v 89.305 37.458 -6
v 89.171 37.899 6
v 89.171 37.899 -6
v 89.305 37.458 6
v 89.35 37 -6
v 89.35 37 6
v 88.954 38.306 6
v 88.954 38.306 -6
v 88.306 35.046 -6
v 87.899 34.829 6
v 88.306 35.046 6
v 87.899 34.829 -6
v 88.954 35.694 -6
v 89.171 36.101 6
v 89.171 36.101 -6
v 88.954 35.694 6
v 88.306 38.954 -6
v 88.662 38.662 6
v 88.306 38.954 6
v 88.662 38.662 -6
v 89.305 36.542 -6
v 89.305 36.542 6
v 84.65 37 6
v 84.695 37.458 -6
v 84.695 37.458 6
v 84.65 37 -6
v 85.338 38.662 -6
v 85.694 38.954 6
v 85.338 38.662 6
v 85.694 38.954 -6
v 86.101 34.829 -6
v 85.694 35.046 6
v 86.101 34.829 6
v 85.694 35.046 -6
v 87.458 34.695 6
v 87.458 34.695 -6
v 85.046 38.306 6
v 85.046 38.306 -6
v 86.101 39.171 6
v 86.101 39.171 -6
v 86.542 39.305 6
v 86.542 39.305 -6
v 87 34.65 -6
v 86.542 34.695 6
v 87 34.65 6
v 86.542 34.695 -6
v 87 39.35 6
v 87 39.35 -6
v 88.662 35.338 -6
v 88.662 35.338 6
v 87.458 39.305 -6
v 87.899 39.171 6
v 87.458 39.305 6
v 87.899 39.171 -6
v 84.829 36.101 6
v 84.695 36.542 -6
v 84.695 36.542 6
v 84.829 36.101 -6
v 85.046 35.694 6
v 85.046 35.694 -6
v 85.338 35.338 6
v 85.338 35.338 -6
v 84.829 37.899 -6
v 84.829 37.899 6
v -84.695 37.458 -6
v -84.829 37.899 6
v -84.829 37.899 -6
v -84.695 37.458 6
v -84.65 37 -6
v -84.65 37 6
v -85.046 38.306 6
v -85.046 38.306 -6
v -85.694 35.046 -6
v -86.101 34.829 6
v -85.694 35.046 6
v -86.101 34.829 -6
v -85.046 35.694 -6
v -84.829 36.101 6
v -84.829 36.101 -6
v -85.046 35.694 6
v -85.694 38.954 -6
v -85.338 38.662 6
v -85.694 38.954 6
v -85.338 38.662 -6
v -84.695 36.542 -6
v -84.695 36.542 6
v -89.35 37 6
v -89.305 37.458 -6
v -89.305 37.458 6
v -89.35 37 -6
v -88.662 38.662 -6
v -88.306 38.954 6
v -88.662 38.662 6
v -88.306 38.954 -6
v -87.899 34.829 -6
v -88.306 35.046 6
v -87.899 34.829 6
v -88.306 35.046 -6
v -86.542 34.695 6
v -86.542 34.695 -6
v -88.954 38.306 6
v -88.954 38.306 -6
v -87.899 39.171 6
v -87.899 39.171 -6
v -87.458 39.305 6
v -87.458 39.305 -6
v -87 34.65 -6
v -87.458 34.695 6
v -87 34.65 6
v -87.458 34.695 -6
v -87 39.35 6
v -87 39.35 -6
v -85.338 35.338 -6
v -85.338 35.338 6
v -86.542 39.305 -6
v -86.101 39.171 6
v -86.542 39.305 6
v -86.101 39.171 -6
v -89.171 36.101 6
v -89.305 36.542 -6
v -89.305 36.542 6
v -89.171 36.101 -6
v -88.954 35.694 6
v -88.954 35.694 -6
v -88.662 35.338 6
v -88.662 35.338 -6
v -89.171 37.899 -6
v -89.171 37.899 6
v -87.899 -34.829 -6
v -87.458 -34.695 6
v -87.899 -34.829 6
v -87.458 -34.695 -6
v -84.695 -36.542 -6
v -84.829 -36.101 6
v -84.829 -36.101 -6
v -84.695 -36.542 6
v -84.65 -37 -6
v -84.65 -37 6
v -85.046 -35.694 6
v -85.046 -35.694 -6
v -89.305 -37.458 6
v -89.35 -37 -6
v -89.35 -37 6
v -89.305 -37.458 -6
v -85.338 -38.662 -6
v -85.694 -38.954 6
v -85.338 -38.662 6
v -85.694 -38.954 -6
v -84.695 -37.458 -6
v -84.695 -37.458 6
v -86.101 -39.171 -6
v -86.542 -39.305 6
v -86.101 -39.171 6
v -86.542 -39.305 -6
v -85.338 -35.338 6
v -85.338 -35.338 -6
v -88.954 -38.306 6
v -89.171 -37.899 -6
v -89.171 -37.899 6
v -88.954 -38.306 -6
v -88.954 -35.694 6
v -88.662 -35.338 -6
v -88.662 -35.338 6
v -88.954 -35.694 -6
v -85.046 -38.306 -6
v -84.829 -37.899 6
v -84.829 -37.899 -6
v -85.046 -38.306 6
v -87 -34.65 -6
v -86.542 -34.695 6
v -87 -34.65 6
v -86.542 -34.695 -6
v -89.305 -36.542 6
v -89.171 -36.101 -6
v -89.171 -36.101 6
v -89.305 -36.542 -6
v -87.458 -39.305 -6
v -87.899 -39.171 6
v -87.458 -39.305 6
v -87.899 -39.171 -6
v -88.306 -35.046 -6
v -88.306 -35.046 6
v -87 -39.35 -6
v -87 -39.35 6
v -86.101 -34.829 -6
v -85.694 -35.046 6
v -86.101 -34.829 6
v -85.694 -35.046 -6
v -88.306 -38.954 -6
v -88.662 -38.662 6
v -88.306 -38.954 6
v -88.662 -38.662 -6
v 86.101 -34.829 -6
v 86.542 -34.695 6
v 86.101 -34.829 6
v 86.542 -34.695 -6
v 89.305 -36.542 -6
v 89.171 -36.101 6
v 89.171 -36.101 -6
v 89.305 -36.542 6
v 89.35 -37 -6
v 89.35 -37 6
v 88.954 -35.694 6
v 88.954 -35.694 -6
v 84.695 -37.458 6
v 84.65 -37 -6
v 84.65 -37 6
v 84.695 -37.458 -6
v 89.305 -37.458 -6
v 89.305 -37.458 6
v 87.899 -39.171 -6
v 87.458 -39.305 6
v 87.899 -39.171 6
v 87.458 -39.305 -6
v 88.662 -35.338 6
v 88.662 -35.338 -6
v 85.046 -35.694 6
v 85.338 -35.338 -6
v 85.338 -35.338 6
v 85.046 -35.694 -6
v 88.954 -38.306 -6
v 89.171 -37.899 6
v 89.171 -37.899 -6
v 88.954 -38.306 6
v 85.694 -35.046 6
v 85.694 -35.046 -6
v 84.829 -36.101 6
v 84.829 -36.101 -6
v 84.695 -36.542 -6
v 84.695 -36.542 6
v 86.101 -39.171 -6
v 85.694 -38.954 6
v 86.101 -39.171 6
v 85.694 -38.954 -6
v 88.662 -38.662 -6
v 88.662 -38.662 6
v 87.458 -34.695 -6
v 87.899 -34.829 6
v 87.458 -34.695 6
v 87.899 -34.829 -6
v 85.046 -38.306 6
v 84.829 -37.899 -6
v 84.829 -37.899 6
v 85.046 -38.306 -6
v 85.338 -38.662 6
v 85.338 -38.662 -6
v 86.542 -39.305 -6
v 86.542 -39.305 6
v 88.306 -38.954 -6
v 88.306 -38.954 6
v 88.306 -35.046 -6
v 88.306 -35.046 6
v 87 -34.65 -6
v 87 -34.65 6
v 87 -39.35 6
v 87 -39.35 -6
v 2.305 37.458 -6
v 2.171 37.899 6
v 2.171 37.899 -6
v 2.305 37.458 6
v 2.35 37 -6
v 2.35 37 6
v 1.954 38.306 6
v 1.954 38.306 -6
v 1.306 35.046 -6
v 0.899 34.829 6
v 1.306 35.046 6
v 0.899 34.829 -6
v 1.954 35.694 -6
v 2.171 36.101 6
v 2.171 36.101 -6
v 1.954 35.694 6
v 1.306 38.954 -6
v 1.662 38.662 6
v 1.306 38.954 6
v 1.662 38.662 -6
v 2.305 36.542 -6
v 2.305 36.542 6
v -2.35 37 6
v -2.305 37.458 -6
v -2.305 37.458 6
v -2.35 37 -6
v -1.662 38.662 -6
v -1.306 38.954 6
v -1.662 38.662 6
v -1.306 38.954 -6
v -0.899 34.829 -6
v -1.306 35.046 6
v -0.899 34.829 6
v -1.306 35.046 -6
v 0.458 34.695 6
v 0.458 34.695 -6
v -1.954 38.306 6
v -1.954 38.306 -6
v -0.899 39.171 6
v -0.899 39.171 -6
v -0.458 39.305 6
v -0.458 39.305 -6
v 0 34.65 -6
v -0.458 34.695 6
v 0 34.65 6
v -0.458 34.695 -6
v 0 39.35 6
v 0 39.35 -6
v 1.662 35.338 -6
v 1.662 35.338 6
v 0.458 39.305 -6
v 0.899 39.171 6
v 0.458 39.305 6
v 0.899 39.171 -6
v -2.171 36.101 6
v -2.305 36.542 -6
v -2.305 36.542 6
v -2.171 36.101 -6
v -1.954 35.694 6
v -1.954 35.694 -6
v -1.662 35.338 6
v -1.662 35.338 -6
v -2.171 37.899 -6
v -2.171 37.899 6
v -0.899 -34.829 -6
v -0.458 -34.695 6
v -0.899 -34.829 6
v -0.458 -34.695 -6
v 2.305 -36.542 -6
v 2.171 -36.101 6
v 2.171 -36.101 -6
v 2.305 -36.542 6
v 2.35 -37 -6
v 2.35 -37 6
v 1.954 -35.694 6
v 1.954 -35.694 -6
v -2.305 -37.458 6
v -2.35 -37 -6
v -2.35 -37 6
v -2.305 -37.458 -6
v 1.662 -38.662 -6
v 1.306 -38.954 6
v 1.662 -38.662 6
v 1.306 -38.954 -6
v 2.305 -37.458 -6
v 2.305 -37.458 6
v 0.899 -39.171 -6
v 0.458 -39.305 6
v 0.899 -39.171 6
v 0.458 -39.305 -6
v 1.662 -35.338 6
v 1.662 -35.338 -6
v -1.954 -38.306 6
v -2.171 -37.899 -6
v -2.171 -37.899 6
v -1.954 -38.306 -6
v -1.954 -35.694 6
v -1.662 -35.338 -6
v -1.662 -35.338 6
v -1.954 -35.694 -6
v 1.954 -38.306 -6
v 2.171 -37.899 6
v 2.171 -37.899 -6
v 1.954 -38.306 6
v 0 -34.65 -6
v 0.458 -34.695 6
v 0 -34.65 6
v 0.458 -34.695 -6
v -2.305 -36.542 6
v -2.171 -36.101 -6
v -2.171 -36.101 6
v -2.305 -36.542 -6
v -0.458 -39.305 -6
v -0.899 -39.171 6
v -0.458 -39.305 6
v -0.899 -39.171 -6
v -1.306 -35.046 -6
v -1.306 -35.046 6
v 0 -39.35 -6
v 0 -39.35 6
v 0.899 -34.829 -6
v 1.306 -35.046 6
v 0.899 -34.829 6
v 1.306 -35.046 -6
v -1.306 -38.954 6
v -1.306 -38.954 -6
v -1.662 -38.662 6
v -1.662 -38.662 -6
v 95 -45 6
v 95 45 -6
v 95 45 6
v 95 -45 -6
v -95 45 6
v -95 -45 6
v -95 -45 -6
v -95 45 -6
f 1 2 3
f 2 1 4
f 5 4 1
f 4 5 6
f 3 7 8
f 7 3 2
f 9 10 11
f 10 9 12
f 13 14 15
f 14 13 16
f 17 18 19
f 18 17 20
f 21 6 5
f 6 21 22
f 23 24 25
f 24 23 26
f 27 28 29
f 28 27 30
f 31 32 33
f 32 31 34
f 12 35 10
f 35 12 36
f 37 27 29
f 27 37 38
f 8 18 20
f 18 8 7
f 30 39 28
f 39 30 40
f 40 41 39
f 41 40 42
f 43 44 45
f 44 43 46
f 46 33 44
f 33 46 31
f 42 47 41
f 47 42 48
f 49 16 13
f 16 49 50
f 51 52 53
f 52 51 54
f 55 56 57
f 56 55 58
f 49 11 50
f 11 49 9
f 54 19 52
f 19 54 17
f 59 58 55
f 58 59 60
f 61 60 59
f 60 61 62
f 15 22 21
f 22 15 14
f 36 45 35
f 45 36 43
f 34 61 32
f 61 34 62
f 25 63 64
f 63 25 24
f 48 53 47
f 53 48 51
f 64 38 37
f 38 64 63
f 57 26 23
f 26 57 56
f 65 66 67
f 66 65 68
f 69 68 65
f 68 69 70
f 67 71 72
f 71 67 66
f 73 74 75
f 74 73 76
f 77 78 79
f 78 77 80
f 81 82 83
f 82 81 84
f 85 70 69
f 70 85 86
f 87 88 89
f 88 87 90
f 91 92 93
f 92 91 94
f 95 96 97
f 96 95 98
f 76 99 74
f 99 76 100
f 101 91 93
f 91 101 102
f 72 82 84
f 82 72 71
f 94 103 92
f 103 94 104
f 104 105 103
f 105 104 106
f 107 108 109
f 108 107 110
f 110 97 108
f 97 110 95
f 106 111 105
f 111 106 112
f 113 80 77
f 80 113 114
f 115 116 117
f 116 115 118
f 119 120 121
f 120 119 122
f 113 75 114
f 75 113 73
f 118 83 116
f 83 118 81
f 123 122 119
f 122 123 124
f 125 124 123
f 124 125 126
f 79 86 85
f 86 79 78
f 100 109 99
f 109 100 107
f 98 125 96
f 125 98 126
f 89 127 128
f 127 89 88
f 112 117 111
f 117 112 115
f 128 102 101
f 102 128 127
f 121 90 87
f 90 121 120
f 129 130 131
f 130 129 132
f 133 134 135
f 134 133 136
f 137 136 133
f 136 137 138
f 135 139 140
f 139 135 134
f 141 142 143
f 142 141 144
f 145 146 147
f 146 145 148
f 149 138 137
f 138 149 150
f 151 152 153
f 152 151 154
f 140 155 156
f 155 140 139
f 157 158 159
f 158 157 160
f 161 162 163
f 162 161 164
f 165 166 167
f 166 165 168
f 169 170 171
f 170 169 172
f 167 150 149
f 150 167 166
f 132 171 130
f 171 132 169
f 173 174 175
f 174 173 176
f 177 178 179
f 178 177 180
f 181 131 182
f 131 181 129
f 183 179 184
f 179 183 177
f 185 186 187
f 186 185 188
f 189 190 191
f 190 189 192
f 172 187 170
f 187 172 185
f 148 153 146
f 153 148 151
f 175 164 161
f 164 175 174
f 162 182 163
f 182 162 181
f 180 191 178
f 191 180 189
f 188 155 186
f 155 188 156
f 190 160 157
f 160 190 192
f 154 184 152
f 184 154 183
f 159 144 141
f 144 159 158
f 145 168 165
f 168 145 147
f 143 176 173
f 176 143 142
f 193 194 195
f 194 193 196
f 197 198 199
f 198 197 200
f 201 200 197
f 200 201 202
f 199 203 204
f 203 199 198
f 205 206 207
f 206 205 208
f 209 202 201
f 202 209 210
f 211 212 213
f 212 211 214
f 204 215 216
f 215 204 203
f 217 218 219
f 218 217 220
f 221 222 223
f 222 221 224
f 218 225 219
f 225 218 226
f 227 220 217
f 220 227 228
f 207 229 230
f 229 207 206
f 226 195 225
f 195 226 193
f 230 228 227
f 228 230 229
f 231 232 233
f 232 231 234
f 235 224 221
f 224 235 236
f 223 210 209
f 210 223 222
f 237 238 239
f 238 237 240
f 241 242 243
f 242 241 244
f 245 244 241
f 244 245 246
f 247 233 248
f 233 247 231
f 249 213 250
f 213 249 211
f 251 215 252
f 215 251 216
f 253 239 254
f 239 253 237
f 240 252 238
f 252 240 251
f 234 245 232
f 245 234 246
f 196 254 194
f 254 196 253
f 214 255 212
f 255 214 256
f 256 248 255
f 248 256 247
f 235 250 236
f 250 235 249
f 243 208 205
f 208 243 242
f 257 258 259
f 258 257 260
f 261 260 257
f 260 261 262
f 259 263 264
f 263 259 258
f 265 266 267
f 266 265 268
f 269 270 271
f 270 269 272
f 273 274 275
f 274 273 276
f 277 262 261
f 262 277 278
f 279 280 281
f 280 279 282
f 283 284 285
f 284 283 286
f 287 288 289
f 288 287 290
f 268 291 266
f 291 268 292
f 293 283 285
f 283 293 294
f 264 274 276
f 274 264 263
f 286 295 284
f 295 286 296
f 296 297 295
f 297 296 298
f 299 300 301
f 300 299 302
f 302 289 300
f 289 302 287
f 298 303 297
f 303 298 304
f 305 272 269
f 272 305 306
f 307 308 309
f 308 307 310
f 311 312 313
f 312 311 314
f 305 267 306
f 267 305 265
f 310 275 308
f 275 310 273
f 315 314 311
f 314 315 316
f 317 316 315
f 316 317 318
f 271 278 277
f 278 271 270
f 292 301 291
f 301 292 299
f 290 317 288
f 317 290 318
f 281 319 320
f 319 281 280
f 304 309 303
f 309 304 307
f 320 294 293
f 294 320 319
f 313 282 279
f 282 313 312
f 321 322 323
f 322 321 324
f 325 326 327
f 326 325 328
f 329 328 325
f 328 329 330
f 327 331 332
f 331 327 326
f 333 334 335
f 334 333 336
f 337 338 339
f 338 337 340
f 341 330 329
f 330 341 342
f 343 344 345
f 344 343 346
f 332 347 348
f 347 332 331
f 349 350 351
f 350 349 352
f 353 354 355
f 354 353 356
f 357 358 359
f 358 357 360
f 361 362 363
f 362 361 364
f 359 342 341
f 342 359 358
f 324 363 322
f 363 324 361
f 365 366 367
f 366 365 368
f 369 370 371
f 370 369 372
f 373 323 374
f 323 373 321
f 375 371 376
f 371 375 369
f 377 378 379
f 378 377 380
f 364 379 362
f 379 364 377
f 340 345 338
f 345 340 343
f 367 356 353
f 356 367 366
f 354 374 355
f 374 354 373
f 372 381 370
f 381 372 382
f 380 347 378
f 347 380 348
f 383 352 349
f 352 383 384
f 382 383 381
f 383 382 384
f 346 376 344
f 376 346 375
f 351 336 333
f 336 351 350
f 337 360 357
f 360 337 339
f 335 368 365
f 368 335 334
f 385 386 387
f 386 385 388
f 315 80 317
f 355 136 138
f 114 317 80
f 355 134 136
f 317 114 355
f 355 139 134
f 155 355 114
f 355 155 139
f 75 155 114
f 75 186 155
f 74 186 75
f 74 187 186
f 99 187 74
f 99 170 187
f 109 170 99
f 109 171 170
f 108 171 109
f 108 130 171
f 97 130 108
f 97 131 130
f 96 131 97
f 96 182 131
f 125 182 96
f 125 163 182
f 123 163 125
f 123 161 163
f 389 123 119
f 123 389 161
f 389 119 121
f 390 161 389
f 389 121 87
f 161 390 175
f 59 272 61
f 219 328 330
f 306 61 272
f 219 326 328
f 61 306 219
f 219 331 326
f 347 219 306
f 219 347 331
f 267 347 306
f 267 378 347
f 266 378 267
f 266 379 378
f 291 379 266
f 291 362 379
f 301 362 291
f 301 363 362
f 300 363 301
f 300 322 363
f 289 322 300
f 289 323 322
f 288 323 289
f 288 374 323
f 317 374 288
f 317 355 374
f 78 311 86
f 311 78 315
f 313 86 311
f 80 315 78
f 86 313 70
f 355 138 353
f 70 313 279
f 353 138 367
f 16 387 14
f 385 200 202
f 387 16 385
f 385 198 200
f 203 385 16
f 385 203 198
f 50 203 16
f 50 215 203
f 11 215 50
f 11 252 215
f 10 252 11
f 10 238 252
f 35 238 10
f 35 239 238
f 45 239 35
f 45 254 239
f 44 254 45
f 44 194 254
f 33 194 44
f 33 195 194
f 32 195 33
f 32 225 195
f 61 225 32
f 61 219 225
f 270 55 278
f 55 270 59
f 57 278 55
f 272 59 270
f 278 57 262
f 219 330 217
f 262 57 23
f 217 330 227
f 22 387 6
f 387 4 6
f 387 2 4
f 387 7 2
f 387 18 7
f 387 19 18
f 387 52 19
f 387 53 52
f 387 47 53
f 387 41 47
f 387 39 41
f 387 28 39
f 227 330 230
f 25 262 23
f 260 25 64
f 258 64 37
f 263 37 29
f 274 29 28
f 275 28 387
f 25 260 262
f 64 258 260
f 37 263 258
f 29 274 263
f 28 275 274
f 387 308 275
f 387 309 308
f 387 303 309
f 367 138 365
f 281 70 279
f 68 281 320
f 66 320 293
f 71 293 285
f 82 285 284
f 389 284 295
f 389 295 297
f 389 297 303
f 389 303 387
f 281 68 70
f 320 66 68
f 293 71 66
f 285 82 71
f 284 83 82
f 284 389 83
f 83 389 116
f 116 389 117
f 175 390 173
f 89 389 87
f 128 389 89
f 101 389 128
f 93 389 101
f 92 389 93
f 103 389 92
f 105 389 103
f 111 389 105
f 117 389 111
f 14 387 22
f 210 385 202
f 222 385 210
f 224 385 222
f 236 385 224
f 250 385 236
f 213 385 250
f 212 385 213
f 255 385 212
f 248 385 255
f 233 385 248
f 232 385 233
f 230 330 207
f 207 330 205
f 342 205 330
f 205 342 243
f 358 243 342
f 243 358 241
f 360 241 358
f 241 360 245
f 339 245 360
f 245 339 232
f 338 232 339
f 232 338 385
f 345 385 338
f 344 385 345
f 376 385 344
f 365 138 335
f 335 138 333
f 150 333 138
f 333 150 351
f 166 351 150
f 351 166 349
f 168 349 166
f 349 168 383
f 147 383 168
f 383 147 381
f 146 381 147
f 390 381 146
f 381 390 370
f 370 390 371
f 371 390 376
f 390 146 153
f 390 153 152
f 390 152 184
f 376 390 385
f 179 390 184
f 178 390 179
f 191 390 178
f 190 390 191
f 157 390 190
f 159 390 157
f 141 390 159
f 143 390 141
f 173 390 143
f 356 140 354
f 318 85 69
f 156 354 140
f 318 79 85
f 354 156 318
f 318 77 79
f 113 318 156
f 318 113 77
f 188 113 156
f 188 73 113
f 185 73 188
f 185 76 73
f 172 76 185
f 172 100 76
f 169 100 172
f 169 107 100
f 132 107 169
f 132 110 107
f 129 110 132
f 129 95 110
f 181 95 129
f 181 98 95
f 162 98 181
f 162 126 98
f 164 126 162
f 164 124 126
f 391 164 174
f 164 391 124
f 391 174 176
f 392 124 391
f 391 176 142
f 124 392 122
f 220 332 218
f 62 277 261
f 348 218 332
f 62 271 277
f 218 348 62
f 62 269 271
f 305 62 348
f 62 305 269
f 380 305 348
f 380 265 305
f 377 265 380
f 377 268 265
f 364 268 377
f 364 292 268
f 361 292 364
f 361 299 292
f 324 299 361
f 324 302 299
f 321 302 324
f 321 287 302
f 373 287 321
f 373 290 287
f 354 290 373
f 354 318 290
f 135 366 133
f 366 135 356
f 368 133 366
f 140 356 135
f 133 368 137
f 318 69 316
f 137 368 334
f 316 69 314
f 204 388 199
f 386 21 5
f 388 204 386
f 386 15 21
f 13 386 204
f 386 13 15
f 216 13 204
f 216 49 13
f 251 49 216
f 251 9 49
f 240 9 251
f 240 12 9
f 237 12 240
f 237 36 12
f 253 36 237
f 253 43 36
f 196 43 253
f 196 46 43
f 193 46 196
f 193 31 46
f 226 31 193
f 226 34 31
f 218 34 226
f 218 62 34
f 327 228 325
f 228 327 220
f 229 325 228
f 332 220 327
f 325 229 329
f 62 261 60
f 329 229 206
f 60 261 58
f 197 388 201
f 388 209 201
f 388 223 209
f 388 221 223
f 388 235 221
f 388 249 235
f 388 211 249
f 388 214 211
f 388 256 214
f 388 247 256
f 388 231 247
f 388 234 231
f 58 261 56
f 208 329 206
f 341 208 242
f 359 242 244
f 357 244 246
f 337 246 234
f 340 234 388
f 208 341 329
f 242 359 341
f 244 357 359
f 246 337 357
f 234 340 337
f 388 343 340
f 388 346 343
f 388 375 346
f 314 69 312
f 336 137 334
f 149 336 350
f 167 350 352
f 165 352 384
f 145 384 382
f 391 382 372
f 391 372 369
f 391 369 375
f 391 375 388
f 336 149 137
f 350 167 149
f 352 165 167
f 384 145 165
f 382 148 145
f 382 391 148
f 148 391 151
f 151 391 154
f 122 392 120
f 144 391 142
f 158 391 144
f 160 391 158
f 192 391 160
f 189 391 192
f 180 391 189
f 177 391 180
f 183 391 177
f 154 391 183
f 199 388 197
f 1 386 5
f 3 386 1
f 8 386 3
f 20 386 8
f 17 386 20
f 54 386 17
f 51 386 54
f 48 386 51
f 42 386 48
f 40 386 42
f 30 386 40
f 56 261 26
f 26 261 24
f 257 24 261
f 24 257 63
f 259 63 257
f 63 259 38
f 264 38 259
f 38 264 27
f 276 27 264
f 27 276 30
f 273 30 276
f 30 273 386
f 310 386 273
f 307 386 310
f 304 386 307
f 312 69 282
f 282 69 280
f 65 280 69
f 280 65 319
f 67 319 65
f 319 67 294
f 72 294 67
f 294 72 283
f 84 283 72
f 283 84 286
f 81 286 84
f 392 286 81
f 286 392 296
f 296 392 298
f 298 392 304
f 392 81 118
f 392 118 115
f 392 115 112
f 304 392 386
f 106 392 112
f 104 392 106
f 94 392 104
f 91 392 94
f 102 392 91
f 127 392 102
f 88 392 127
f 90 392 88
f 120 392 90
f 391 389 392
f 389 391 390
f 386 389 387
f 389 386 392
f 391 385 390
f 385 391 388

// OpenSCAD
$fn = 32;

// ----------------------------------------------------------------------
// Corner plate 190 x 90 x 12
// 6 holes, centres taken from the edge offset
// ----------------------------------------------------------------------

// --- parameters (mm) ---
plate = [190, 90, 12];  // overall size (x, y, z)
holes = 6;              // number of holes the drawing asks for
bore_d = 4.5;           // nominal hole diameter from the drawing
print_allowance = 0.2;  // clearance added for printing
edge = 8;               // hole centre offset from the plate edge

// --- derived feature positions (mm) ---
hole_d = bore_d + print_allowance;  // = 4.7   hole diameter as printed
corner_x = plate[0] / 2 - edge;     // = 87   corner hole X
corner_y = plate[1] / 2 - edge;     // = 37   corner hole Y
feature_centers = [
  [corner_x, corner_y],
  [-corner_x, corner_y],
  [-corner_x, -corner_y],
  [corner_x, -corner_y],
  [0, corner_y],
  [0, -corner_y]
];   // hole centres the loop below drills

// plate outline, every hole drilled through with the same cutters
difference() {
  cube(plate, center = true);
  for (centre = feature_centers)
    translate([centre[0], centre[1], 0])
      cylinder(d = hole_d, h = plate[2] + 2, center = true);
}
